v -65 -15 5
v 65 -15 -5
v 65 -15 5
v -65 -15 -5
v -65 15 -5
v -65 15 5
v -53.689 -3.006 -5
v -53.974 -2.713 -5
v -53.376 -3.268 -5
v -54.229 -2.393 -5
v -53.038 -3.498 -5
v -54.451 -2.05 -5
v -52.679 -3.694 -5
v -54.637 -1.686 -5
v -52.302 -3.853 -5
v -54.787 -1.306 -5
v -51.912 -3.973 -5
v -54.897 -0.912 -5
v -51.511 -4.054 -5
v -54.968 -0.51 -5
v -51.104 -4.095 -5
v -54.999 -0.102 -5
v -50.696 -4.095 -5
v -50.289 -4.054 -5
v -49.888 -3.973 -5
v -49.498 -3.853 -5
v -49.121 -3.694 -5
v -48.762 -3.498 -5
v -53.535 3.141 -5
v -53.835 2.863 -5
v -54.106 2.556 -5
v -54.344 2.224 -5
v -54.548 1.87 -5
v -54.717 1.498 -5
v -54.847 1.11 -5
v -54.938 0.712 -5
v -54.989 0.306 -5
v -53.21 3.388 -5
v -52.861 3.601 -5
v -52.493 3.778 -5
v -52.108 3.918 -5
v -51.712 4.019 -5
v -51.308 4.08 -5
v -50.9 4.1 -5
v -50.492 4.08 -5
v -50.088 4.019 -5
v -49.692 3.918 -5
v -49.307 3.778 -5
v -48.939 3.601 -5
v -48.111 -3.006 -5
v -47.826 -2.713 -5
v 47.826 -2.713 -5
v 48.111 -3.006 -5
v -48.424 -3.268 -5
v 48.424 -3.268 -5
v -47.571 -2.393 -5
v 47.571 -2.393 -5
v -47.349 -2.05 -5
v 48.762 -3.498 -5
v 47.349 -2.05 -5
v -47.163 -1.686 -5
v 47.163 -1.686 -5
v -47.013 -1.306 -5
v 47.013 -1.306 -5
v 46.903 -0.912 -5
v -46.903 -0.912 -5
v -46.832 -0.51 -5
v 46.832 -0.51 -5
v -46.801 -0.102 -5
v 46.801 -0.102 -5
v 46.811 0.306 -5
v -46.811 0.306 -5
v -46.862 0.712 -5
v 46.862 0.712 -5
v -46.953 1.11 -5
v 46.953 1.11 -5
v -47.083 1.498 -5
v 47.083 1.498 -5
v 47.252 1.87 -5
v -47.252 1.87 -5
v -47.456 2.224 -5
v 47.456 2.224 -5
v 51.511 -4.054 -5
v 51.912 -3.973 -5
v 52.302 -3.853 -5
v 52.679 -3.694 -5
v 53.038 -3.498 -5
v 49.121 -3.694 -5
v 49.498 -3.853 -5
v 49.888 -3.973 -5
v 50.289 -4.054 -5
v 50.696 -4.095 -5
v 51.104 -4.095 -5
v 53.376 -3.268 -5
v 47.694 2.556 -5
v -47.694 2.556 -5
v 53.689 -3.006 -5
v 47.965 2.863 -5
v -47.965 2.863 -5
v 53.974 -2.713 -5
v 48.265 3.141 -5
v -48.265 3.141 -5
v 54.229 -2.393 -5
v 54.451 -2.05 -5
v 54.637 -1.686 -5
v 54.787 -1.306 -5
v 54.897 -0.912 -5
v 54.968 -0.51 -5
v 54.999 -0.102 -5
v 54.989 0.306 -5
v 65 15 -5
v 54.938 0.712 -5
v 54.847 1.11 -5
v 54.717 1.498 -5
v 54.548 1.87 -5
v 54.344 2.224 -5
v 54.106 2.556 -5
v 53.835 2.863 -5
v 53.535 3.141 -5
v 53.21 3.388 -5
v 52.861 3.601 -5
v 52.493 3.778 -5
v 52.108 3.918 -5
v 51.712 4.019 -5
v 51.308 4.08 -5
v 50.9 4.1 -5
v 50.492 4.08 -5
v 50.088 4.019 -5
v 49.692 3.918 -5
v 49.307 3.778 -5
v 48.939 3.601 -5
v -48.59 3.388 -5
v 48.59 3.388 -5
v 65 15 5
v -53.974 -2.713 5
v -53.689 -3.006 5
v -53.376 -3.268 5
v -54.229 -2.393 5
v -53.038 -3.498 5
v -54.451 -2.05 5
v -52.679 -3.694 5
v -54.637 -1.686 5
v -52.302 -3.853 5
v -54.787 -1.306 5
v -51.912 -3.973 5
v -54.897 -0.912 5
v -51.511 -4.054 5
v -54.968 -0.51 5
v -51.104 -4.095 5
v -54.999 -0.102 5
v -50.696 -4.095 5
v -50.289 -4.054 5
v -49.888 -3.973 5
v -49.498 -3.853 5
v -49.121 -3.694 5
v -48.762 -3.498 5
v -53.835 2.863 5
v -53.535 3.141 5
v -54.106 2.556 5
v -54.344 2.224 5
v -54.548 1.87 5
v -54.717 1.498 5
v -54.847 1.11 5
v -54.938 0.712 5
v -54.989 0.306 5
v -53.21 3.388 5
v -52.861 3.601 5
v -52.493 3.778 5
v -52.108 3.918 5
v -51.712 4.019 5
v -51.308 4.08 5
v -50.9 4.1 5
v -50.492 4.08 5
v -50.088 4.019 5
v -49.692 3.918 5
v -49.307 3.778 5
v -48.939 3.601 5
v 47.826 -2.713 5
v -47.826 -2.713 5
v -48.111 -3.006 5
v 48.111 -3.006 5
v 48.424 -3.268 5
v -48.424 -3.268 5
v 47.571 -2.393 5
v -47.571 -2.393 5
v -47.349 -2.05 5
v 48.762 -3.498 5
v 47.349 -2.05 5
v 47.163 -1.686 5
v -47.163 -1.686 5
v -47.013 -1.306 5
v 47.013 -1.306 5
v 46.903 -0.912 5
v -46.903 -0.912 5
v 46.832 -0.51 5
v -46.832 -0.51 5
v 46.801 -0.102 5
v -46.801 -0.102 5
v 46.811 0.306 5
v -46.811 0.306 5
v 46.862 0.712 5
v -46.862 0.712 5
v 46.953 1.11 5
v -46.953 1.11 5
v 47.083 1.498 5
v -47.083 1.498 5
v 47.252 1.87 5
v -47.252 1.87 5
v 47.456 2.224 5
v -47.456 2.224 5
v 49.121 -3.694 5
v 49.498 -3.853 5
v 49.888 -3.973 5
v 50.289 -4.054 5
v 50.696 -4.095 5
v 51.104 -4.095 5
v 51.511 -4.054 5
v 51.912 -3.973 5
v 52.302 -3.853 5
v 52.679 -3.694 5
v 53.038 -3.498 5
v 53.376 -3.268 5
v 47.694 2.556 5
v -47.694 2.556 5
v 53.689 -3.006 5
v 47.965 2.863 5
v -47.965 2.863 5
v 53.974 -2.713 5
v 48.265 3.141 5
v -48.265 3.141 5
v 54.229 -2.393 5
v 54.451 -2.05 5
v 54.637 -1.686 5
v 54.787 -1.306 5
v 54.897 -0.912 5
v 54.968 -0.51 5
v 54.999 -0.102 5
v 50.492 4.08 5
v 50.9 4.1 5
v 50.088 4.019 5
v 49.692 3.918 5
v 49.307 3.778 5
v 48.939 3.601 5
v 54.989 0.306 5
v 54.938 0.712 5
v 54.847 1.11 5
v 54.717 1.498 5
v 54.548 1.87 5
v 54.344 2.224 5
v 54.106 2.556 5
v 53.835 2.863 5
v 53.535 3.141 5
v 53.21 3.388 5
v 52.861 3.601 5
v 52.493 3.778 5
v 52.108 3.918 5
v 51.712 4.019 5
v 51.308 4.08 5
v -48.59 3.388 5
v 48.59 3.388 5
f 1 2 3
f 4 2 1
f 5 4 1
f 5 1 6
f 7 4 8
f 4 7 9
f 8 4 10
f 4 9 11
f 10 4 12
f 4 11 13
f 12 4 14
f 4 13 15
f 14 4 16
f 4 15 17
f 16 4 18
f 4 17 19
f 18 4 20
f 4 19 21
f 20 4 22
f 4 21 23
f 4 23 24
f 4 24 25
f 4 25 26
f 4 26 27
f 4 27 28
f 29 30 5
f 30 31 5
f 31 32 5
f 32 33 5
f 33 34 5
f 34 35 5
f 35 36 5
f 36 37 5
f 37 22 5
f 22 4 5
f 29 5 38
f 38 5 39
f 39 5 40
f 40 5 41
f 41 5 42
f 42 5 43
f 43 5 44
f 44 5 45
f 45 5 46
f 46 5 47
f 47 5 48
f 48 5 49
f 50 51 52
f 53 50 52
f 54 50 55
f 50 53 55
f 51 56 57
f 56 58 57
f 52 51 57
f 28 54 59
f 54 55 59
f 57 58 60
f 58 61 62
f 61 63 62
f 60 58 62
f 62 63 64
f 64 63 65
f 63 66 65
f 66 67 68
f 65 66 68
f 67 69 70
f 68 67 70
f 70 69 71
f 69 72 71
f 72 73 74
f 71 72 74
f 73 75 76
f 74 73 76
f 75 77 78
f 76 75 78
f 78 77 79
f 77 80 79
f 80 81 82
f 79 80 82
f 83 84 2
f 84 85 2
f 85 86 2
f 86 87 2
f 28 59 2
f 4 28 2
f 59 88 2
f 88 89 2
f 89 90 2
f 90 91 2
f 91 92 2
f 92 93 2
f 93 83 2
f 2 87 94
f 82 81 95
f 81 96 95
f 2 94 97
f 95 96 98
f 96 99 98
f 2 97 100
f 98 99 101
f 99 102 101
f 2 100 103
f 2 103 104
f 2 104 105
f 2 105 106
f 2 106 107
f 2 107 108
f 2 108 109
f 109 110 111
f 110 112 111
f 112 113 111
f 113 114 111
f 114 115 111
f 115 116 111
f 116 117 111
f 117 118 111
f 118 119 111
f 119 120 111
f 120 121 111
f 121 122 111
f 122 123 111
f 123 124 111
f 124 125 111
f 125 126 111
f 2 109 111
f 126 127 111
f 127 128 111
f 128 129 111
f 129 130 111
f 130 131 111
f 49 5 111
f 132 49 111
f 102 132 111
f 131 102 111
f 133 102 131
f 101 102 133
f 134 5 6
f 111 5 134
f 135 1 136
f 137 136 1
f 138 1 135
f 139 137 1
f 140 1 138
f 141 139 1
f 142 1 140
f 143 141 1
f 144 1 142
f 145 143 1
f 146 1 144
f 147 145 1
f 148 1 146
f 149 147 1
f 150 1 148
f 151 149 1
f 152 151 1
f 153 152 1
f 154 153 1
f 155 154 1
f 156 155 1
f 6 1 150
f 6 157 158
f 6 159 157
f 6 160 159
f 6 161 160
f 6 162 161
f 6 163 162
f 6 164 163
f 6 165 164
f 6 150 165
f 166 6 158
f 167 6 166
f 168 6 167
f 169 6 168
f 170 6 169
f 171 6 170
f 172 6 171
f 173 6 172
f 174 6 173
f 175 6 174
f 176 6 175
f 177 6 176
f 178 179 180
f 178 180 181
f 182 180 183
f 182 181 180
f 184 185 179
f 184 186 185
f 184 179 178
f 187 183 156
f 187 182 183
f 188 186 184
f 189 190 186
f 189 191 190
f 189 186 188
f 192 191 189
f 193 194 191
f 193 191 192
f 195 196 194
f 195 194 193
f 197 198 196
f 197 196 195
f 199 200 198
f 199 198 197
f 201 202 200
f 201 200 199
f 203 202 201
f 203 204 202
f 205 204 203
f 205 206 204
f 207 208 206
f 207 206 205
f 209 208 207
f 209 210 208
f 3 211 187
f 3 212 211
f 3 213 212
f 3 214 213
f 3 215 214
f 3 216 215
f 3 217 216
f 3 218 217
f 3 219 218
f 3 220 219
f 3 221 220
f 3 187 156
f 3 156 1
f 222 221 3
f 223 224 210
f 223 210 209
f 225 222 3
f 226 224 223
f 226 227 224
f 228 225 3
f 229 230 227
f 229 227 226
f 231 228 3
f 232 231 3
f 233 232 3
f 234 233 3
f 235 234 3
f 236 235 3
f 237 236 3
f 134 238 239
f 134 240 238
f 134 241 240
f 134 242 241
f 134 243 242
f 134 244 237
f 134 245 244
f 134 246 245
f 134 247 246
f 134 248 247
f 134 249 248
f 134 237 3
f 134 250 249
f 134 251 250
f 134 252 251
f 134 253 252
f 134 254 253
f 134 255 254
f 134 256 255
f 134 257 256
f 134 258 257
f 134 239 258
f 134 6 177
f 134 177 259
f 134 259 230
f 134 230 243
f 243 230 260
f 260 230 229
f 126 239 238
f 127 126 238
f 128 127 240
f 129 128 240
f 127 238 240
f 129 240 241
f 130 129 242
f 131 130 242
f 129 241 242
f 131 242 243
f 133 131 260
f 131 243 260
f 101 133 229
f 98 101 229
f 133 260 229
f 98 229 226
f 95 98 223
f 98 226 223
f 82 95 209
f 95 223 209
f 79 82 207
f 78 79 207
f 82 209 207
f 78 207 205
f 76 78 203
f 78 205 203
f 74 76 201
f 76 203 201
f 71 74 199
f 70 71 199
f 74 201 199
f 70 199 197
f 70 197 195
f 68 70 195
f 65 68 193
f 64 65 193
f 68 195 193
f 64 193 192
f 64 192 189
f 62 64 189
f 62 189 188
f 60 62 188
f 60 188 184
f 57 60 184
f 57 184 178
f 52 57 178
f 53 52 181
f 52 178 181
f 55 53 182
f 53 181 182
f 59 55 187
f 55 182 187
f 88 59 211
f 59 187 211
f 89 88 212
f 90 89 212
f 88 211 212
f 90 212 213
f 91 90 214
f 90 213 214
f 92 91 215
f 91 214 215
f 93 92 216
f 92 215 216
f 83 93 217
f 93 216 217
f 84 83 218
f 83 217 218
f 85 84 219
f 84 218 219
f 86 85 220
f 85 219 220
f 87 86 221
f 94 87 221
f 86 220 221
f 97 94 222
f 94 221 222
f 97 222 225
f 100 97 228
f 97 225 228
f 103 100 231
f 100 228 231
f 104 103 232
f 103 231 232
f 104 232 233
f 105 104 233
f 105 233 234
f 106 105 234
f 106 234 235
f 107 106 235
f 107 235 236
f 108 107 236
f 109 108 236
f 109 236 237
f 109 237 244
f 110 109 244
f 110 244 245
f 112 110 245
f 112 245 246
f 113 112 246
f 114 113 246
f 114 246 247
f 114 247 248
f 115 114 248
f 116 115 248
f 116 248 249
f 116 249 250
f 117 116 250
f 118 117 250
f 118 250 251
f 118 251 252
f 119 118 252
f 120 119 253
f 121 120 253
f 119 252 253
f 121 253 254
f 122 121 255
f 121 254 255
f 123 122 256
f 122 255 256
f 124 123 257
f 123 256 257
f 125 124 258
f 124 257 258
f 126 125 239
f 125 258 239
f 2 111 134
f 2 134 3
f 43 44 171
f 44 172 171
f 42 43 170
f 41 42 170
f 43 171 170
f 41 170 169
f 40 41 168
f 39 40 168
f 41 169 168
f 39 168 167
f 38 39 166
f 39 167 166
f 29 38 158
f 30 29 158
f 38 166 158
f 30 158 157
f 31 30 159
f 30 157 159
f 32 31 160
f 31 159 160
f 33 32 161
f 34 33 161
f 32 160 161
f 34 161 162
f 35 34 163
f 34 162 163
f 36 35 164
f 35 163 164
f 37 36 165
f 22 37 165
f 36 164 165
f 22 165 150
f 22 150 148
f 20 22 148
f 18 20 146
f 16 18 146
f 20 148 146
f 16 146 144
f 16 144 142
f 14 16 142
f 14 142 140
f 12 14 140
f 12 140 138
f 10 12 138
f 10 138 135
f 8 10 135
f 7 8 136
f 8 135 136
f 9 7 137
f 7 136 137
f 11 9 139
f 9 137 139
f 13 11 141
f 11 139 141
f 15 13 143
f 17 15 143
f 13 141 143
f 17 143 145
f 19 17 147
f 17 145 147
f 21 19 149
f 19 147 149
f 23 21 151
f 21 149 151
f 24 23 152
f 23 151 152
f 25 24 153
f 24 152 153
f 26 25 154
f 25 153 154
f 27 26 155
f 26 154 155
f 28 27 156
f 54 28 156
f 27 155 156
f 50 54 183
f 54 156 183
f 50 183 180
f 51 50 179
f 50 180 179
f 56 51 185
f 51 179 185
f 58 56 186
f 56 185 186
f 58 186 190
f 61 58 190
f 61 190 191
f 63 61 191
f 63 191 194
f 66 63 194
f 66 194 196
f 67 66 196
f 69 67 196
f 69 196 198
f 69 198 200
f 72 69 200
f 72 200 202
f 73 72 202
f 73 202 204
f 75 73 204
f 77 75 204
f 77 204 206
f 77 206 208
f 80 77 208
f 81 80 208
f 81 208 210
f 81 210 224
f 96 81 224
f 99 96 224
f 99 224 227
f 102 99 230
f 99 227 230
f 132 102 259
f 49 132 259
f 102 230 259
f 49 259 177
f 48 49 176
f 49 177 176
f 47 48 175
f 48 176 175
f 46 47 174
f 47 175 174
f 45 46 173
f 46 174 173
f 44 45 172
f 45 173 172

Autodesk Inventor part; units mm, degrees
ref_plane "YZ Plane" through (0, 0, 0) normal (1, 0, 0) x (0, 1, 0)
ref_plane "XZ Plane" through (0, 0, 0) normal (0, 1, 0) x (-1, 0, 0)
ref_plane "XY Plane" through (0, 0, 0) normal (0, 0, 1) x (1, 0, 0)
sketch "Sketch1" plane through (0, 0, 0) normal (0, 0, 1) x (1, 0, 0)
  line L0 (0, 21) -> (0, -21) construction
  line L1 (-91, 0) -> (91, 0) construction
  line L2 (65, -15) -> (-65, -15)
  line L3 (-65, -15) -> (-65, 15)
  line L4 (-65, 15) -> (65, 15)
  line L5 (65, 15) -> (65, -15)
  line L6 (65, -15) -> (-65, 15) construction
  line L7 (-65, -15) -> (65, 15) construction
  point P0 (0, 0)
  dimension "d4" = 130
  dimension "d5" = 30
extrude "Extrusion3" add sketch "Sketch1" along normal mid plane 10
sketch "Sketch2" plane through (0, 0, -5) normal (0, 0, -1) x (-1, 0, 0)
  point P0 (0, 0)
  point P1 (-50.9, 0)
  point P2 (50.9, 0)
  dimension "d8" = 101.8
  dimension "d9" = 50.9
hole "Hole1" at (50.9, 0, -5) at (-50.9, 0, -5) direction (0, 0, 1) diameter 8.2 end through all
equation "\"d9\" = 0.5 * d8"
properties part number "17-0028-0035" material "Copper"
